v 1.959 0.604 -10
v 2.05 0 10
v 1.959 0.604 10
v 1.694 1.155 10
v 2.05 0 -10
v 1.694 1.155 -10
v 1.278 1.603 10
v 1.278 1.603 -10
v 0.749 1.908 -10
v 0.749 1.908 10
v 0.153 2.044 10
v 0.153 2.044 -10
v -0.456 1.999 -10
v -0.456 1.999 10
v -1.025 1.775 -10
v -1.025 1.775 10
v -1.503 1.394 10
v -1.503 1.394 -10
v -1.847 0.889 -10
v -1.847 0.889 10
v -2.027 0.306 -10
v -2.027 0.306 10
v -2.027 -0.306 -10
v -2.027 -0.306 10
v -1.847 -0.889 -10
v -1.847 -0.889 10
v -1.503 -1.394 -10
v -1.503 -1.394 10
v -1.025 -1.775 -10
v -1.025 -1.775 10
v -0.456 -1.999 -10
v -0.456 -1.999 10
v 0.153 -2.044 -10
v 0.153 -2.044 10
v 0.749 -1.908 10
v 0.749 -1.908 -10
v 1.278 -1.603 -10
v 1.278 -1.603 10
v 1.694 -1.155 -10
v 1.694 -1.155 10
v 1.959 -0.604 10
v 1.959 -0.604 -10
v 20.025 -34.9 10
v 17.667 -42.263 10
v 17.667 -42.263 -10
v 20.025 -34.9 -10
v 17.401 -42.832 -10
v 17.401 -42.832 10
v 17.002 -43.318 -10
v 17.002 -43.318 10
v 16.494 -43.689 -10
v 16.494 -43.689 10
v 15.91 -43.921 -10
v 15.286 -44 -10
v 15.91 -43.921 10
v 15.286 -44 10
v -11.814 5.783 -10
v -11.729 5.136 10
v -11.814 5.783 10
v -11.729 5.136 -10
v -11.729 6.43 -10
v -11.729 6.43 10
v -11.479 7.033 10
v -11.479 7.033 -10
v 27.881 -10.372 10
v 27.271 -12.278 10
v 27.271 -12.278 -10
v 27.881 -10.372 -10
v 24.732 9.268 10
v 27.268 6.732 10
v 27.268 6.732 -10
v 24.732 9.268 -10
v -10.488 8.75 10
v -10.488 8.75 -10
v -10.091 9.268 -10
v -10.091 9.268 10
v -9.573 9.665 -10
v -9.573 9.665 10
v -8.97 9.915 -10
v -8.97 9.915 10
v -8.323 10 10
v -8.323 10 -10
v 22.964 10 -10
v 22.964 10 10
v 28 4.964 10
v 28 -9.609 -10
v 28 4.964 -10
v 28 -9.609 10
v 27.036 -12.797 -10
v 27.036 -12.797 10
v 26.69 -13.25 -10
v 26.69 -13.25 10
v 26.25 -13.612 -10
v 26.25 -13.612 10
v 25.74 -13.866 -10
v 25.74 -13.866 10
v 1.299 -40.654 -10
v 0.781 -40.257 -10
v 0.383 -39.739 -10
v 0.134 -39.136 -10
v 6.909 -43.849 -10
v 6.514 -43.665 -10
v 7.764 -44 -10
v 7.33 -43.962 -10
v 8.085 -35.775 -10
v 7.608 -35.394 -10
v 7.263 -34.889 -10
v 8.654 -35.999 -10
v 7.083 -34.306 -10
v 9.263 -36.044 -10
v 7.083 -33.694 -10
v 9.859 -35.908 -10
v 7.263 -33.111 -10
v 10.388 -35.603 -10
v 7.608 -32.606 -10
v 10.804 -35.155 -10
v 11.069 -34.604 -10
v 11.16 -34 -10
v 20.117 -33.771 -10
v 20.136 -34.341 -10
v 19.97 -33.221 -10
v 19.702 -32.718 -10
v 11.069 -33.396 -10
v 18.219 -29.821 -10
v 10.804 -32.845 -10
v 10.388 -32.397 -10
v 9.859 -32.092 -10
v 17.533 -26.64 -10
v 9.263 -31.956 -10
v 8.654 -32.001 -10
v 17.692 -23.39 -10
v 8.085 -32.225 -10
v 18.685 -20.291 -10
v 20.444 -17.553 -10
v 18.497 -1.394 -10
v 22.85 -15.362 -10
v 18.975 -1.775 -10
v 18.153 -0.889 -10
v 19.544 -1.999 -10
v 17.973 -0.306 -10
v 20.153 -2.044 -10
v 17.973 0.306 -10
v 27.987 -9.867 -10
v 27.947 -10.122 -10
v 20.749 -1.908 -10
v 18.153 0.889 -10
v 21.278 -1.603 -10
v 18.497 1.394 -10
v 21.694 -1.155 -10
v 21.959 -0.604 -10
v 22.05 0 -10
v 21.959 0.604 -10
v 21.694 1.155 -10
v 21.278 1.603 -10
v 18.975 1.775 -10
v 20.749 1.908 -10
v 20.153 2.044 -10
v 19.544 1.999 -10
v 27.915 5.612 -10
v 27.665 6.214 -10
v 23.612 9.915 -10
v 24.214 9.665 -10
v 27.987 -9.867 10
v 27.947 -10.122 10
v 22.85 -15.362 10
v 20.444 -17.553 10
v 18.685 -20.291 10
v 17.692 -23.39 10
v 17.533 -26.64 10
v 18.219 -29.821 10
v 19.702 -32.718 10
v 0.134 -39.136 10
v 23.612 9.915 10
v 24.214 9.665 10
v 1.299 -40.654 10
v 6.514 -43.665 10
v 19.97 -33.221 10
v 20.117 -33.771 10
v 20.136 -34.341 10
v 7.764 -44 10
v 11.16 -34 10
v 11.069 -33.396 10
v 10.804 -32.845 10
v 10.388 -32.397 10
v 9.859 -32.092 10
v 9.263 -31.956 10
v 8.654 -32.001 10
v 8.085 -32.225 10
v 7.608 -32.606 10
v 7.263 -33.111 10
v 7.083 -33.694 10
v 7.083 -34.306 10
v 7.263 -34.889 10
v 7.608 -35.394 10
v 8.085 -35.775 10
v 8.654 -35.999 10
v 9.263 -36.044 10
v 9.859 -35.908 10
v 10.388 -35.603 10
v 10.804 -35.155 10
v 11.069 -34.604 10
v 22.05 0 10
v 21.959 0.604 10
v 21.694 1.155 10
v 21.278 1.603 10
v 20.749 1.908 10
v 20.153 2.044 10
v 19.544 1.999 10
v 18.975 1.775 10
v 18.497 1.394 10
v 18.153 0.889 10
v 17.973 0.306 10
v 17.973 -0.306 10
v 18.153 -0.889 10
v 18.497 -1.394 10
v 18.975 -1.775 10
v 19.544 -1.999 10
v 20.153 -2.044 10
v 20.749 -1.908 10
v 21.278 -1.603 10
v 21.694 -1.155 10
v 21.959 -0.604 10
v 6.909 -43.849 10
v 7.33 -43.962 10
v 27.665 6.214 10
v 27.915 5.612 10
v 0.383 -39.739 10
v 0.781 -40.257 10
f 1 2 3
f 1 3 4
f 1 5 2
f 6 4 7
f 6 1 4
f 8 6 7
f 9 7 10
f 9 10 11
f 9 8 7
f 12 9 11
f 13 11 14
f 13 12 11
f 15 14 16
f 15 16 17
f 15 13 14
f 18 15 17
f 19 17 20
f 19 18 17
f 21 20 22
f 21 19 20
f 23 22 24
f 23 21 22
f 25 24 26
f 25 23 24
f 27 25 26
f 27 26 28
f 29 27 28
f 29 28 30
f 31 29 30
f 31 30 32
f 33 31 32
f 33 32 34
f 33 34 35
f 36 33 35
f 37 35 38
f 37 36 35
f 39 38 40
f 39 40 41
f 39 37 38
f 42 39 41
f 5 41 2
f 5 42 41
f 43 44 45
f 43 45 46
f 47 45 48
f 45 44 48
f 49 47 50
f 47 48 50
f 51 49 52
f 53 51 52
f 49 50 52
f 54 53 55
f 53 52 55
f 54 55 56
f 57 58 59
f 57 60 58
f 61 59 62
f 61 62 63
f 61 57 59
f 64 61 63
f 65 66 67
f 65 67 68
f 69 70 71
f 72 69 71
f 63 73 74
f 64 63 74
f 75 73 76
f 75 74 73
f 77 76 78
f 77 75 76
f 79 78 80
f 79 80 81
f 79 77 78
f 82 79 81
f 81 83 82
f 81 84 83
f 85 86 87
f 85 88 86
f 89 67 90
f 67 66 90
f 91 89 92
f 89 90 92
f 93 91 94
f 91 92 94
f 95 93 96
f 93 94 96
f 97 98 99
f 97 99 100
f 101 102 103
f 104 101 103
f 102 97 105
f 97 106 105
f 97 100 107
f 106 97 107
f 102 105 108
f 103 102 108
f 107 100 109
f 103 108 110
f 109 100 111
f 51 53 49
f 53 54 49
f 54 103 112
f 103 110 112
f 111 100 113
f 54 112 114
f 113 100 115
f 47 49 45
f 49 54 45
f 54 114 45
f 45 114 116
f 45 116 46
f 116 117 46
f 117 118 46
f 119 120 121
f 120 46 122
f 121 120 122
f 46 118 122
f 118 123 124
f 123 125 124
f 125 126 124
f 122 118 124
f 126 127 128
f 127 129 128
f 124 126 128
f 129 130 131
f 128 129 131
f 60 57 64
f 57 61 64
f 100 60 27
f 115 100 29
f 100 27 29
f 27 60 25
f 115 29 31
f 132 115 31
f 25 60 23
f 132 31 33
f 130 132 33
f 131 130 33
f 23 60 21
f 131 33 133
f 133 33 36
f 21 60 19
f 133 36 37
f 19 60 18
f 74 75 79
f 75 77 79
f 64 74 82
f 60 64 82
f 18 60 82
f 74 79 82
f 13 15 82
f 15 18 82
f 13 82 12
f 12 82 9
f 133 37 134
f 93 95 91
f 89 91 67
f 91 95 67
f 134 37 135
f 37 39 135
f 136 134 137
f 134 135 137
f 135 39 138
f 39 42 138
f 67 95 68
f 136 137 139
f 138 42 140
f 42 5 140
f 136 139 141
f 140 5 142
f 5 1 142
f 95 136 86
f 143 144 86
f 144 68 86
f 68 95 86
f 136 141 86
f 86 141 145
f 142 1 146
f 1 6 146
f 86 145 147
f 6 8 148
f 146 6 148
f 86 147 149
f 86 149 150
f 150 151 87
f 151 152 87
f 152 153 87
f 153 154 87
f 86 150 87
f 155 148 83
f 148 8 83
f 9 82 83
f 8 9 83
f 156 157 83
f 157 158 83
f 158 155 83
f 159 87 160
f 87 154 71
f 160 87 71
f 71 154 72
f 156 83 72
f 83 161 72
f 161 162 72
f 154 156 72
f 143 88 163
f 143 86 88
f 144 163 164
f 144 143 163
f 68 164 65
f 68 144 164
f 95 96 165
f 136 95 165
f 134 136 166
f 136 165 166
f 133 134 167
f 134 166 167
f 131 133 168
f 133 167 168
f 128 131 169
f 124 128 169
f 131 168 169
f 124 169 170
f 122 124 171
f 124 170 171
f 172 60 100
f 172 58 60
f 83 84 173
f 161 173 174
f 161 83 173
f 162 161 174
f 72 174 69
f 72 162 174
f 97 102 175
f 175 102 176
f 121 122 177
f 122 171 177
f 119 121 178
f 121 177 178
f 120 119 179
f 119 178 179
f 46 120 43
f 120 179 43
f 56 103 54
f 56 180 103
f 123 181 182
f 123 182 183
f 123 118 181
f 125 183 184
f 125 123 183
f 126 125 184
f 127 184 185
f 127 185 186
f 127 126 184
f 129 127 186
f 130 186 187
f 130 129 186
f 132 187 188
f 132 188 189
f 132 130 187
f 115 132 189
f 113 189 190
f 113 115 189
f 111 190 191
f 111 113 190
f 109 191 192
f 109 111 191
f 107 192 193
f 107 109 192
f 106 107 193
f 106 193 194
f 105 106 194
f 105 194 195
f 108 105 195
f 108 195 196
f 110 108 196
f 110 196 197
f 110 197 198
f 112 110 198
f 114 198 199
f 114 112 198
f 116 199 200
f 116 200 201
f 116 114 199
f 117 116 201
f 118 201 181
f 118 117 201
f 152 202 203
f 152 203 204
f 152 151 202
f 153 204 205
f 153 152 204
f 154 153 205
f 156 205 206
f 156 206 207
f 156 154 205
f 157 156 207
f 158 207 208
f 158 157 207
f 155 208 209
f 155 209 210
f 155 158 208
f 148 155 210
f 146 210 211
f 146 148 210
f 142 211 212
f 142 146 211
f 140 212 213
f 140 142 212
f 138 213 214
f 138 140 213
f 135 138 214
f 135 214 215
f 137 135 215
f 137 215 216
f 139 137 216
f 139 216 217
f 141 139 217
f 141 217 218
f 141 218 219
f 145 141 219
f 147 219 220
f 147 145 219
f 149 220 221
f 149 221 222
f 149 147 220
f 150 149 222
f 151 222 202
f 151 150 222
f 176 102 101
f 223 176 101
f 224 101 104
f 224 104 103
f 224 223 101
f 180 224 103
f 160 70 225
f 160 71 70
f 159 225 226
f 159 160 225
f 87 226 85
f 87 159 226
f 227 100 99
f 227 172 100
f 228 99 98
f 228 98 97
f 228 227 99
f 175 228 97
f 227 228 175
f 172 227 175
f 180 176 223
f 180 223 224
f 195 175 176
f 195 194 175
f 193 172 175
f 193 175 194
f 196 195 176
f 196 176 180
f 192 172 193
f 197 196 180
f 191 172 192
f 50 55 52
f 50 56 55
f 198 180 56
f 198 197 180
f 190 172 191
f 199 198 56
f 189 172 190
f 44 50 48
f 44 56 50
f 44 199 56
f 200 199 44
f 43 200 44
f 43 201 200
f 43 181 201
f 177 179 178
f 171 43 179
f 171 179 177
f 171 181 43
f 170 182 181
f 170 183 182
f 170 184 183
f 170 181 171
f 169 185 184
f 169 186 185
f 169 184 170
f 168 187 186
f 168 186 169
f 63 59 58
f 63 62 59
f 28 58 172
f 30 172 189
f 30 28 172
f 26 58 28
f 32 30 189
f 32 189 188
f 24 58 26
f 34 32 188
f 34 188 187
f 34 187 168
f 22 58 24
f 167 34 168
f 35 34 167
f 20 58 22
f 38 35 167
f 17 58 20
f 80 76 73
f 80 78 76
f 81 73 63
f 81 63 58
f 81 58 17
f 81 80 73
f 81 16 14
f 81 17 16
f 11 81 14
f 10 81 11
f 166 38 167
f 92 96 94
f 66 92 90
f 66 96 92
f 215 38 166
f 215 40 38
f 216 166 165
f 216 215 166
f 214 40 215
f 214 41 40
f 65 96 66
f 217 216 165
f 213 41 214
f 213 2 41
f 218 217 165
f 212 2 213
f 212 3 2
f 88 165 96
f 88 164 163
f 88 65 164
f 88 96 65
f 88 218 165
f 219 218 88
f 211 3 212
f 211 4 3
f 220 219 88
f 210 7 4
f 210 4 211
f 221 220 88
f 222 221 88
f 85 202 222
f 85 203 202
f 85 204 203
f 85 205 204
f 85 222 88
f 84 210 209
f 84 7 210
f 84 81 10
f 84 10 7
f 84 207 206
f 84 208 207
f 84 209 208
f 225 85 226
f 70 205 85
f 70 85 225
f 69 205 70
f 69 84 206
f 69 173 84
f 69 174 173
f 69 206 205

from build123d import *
from OCP.BRepFilletAPI import BRepFilletAPI_MakeChamfer

# Parameters (mm, degrees)
SKETCH_1_R          = 2.05
EXTRUDE_1_DEPTH     = 10
CHAMFER_1_SIZE      = 4
CHAMFER_1_SIZE2     = 5.656854249
CHAMFER_1_SIZE2_2   = 3.265986324
SKETCH_2_R          = 12.5
CUT_EXTRUDE_1_DEPTH = 56.856960175
FILLET_1_R          = 2.5


with BuildPart() as part:
    # 草图1 → 凸台-拉伸1 (new, symmetric)
    with BuildSketch(Plane.XY):
        Polygon((-13.032253728, 10), (1.437002663, -44), (17.110272543, -44), (28, -10), (28, 10), align=None)
        Circle(SKETCH_1_R, mode=Mode.SUBTRACT)
        with Locations((20, 0)):
            Circle(SKETCH_1_R, mode=Mode.SUBTRACT)
        with Locations((9.110272543, -34)):
            Circle(SKETCH_1_R, mode=Mode.SUBTRACT)
    extrude(amount=EXTRUDE_1_DEPTH, both=True)

    # 倒角1: one chamfer whose edges measure the first distance from different faces: ONE call of the kernel's chamfer builder (chamfer() names one face for all edges)
    chamfer_1_edges_1 = [part.edges().sort_by_distance(p)[0] for p in [
        (1.437002663, -44, 0),
    ]]
    chamfer_1_side_1 = [part.faces().sort_by_distance(p)[0] for p in [
        (-5.797625533, -17, 0),
    ]]
    chamfer_1_edges_2 = [part.edges().sort_by_distance(p)[0] for p in [
        (-13.032253728, 10, 0),
    ]]
    chamfer_1_side_2 = [part.faces().sort_by_distance(p)[0] for p in [
        (-5.797625533, -17, 0),
    ]]
    chamfer_1_edges_3 = [part.edges().sort_by_distance(p)[0] for p in [
        (28, 10, 0),
    ]]
    chamfer_1 = BRepFilletAPI_MakeChamfer(part.part.solid().wrapped)
    for e in chamfer_1_edges_1:
        chamfer_1.Add(CHAMFER_1_SIZE, CHAMFER_1_SIZE2, e.wrapped, chamfer_1_side_1[0].wrapped)  # the first distance lies on this face
    for e in chamfer_1_edges_2:
        chamfer_1.Add(CHAMFER_1_SIZE, CHAMFER_1_SIZE2_2, e.wrapped, chamfer_1_side_2[0].wrapped)  # the first distance lies on this face
    for e in chamfer_1_edges_3:
        chamfer_1.Add(CHAMFER_1_SIZE, e.wrapped)
    add(Compound.cast(chamfer_1.Shape()), mode=Mode.REPLACE)

    # 草图2 → 切除-拉伸1 (cut, through all)
    with BuildSketch(Plane.XY.offset(10)):
        with Locations((29.991739345, -25.62060001)):
            Circle(SKETCH_2_R)
    extrude(amount=-CUT_EXTRUDE_1_DEPTH, mode=Mode.SUBTRACT)

    # 圆角1
    fillet_1_edges = [part.edges().sort_by_distance(p)[0] for p in [
        (-9.766267405, 10, 0),
        (24, 10, 0),
        (28, 6, 0),
        (0.401726482, -40.136296695, 0),
        (-11.996977548, 6.136296695, 0),
        (7.093856912, -44, 0),
        (26.873983288, -13.515658987, 0),
        (20.421472383, -33.661743602, 0),
        (17.110272543, -44, 0),
        (28, -10, 0),
    ]]
    fillet(fillet_1_edges, radius=FILLET_1_R)


solid = part.part
